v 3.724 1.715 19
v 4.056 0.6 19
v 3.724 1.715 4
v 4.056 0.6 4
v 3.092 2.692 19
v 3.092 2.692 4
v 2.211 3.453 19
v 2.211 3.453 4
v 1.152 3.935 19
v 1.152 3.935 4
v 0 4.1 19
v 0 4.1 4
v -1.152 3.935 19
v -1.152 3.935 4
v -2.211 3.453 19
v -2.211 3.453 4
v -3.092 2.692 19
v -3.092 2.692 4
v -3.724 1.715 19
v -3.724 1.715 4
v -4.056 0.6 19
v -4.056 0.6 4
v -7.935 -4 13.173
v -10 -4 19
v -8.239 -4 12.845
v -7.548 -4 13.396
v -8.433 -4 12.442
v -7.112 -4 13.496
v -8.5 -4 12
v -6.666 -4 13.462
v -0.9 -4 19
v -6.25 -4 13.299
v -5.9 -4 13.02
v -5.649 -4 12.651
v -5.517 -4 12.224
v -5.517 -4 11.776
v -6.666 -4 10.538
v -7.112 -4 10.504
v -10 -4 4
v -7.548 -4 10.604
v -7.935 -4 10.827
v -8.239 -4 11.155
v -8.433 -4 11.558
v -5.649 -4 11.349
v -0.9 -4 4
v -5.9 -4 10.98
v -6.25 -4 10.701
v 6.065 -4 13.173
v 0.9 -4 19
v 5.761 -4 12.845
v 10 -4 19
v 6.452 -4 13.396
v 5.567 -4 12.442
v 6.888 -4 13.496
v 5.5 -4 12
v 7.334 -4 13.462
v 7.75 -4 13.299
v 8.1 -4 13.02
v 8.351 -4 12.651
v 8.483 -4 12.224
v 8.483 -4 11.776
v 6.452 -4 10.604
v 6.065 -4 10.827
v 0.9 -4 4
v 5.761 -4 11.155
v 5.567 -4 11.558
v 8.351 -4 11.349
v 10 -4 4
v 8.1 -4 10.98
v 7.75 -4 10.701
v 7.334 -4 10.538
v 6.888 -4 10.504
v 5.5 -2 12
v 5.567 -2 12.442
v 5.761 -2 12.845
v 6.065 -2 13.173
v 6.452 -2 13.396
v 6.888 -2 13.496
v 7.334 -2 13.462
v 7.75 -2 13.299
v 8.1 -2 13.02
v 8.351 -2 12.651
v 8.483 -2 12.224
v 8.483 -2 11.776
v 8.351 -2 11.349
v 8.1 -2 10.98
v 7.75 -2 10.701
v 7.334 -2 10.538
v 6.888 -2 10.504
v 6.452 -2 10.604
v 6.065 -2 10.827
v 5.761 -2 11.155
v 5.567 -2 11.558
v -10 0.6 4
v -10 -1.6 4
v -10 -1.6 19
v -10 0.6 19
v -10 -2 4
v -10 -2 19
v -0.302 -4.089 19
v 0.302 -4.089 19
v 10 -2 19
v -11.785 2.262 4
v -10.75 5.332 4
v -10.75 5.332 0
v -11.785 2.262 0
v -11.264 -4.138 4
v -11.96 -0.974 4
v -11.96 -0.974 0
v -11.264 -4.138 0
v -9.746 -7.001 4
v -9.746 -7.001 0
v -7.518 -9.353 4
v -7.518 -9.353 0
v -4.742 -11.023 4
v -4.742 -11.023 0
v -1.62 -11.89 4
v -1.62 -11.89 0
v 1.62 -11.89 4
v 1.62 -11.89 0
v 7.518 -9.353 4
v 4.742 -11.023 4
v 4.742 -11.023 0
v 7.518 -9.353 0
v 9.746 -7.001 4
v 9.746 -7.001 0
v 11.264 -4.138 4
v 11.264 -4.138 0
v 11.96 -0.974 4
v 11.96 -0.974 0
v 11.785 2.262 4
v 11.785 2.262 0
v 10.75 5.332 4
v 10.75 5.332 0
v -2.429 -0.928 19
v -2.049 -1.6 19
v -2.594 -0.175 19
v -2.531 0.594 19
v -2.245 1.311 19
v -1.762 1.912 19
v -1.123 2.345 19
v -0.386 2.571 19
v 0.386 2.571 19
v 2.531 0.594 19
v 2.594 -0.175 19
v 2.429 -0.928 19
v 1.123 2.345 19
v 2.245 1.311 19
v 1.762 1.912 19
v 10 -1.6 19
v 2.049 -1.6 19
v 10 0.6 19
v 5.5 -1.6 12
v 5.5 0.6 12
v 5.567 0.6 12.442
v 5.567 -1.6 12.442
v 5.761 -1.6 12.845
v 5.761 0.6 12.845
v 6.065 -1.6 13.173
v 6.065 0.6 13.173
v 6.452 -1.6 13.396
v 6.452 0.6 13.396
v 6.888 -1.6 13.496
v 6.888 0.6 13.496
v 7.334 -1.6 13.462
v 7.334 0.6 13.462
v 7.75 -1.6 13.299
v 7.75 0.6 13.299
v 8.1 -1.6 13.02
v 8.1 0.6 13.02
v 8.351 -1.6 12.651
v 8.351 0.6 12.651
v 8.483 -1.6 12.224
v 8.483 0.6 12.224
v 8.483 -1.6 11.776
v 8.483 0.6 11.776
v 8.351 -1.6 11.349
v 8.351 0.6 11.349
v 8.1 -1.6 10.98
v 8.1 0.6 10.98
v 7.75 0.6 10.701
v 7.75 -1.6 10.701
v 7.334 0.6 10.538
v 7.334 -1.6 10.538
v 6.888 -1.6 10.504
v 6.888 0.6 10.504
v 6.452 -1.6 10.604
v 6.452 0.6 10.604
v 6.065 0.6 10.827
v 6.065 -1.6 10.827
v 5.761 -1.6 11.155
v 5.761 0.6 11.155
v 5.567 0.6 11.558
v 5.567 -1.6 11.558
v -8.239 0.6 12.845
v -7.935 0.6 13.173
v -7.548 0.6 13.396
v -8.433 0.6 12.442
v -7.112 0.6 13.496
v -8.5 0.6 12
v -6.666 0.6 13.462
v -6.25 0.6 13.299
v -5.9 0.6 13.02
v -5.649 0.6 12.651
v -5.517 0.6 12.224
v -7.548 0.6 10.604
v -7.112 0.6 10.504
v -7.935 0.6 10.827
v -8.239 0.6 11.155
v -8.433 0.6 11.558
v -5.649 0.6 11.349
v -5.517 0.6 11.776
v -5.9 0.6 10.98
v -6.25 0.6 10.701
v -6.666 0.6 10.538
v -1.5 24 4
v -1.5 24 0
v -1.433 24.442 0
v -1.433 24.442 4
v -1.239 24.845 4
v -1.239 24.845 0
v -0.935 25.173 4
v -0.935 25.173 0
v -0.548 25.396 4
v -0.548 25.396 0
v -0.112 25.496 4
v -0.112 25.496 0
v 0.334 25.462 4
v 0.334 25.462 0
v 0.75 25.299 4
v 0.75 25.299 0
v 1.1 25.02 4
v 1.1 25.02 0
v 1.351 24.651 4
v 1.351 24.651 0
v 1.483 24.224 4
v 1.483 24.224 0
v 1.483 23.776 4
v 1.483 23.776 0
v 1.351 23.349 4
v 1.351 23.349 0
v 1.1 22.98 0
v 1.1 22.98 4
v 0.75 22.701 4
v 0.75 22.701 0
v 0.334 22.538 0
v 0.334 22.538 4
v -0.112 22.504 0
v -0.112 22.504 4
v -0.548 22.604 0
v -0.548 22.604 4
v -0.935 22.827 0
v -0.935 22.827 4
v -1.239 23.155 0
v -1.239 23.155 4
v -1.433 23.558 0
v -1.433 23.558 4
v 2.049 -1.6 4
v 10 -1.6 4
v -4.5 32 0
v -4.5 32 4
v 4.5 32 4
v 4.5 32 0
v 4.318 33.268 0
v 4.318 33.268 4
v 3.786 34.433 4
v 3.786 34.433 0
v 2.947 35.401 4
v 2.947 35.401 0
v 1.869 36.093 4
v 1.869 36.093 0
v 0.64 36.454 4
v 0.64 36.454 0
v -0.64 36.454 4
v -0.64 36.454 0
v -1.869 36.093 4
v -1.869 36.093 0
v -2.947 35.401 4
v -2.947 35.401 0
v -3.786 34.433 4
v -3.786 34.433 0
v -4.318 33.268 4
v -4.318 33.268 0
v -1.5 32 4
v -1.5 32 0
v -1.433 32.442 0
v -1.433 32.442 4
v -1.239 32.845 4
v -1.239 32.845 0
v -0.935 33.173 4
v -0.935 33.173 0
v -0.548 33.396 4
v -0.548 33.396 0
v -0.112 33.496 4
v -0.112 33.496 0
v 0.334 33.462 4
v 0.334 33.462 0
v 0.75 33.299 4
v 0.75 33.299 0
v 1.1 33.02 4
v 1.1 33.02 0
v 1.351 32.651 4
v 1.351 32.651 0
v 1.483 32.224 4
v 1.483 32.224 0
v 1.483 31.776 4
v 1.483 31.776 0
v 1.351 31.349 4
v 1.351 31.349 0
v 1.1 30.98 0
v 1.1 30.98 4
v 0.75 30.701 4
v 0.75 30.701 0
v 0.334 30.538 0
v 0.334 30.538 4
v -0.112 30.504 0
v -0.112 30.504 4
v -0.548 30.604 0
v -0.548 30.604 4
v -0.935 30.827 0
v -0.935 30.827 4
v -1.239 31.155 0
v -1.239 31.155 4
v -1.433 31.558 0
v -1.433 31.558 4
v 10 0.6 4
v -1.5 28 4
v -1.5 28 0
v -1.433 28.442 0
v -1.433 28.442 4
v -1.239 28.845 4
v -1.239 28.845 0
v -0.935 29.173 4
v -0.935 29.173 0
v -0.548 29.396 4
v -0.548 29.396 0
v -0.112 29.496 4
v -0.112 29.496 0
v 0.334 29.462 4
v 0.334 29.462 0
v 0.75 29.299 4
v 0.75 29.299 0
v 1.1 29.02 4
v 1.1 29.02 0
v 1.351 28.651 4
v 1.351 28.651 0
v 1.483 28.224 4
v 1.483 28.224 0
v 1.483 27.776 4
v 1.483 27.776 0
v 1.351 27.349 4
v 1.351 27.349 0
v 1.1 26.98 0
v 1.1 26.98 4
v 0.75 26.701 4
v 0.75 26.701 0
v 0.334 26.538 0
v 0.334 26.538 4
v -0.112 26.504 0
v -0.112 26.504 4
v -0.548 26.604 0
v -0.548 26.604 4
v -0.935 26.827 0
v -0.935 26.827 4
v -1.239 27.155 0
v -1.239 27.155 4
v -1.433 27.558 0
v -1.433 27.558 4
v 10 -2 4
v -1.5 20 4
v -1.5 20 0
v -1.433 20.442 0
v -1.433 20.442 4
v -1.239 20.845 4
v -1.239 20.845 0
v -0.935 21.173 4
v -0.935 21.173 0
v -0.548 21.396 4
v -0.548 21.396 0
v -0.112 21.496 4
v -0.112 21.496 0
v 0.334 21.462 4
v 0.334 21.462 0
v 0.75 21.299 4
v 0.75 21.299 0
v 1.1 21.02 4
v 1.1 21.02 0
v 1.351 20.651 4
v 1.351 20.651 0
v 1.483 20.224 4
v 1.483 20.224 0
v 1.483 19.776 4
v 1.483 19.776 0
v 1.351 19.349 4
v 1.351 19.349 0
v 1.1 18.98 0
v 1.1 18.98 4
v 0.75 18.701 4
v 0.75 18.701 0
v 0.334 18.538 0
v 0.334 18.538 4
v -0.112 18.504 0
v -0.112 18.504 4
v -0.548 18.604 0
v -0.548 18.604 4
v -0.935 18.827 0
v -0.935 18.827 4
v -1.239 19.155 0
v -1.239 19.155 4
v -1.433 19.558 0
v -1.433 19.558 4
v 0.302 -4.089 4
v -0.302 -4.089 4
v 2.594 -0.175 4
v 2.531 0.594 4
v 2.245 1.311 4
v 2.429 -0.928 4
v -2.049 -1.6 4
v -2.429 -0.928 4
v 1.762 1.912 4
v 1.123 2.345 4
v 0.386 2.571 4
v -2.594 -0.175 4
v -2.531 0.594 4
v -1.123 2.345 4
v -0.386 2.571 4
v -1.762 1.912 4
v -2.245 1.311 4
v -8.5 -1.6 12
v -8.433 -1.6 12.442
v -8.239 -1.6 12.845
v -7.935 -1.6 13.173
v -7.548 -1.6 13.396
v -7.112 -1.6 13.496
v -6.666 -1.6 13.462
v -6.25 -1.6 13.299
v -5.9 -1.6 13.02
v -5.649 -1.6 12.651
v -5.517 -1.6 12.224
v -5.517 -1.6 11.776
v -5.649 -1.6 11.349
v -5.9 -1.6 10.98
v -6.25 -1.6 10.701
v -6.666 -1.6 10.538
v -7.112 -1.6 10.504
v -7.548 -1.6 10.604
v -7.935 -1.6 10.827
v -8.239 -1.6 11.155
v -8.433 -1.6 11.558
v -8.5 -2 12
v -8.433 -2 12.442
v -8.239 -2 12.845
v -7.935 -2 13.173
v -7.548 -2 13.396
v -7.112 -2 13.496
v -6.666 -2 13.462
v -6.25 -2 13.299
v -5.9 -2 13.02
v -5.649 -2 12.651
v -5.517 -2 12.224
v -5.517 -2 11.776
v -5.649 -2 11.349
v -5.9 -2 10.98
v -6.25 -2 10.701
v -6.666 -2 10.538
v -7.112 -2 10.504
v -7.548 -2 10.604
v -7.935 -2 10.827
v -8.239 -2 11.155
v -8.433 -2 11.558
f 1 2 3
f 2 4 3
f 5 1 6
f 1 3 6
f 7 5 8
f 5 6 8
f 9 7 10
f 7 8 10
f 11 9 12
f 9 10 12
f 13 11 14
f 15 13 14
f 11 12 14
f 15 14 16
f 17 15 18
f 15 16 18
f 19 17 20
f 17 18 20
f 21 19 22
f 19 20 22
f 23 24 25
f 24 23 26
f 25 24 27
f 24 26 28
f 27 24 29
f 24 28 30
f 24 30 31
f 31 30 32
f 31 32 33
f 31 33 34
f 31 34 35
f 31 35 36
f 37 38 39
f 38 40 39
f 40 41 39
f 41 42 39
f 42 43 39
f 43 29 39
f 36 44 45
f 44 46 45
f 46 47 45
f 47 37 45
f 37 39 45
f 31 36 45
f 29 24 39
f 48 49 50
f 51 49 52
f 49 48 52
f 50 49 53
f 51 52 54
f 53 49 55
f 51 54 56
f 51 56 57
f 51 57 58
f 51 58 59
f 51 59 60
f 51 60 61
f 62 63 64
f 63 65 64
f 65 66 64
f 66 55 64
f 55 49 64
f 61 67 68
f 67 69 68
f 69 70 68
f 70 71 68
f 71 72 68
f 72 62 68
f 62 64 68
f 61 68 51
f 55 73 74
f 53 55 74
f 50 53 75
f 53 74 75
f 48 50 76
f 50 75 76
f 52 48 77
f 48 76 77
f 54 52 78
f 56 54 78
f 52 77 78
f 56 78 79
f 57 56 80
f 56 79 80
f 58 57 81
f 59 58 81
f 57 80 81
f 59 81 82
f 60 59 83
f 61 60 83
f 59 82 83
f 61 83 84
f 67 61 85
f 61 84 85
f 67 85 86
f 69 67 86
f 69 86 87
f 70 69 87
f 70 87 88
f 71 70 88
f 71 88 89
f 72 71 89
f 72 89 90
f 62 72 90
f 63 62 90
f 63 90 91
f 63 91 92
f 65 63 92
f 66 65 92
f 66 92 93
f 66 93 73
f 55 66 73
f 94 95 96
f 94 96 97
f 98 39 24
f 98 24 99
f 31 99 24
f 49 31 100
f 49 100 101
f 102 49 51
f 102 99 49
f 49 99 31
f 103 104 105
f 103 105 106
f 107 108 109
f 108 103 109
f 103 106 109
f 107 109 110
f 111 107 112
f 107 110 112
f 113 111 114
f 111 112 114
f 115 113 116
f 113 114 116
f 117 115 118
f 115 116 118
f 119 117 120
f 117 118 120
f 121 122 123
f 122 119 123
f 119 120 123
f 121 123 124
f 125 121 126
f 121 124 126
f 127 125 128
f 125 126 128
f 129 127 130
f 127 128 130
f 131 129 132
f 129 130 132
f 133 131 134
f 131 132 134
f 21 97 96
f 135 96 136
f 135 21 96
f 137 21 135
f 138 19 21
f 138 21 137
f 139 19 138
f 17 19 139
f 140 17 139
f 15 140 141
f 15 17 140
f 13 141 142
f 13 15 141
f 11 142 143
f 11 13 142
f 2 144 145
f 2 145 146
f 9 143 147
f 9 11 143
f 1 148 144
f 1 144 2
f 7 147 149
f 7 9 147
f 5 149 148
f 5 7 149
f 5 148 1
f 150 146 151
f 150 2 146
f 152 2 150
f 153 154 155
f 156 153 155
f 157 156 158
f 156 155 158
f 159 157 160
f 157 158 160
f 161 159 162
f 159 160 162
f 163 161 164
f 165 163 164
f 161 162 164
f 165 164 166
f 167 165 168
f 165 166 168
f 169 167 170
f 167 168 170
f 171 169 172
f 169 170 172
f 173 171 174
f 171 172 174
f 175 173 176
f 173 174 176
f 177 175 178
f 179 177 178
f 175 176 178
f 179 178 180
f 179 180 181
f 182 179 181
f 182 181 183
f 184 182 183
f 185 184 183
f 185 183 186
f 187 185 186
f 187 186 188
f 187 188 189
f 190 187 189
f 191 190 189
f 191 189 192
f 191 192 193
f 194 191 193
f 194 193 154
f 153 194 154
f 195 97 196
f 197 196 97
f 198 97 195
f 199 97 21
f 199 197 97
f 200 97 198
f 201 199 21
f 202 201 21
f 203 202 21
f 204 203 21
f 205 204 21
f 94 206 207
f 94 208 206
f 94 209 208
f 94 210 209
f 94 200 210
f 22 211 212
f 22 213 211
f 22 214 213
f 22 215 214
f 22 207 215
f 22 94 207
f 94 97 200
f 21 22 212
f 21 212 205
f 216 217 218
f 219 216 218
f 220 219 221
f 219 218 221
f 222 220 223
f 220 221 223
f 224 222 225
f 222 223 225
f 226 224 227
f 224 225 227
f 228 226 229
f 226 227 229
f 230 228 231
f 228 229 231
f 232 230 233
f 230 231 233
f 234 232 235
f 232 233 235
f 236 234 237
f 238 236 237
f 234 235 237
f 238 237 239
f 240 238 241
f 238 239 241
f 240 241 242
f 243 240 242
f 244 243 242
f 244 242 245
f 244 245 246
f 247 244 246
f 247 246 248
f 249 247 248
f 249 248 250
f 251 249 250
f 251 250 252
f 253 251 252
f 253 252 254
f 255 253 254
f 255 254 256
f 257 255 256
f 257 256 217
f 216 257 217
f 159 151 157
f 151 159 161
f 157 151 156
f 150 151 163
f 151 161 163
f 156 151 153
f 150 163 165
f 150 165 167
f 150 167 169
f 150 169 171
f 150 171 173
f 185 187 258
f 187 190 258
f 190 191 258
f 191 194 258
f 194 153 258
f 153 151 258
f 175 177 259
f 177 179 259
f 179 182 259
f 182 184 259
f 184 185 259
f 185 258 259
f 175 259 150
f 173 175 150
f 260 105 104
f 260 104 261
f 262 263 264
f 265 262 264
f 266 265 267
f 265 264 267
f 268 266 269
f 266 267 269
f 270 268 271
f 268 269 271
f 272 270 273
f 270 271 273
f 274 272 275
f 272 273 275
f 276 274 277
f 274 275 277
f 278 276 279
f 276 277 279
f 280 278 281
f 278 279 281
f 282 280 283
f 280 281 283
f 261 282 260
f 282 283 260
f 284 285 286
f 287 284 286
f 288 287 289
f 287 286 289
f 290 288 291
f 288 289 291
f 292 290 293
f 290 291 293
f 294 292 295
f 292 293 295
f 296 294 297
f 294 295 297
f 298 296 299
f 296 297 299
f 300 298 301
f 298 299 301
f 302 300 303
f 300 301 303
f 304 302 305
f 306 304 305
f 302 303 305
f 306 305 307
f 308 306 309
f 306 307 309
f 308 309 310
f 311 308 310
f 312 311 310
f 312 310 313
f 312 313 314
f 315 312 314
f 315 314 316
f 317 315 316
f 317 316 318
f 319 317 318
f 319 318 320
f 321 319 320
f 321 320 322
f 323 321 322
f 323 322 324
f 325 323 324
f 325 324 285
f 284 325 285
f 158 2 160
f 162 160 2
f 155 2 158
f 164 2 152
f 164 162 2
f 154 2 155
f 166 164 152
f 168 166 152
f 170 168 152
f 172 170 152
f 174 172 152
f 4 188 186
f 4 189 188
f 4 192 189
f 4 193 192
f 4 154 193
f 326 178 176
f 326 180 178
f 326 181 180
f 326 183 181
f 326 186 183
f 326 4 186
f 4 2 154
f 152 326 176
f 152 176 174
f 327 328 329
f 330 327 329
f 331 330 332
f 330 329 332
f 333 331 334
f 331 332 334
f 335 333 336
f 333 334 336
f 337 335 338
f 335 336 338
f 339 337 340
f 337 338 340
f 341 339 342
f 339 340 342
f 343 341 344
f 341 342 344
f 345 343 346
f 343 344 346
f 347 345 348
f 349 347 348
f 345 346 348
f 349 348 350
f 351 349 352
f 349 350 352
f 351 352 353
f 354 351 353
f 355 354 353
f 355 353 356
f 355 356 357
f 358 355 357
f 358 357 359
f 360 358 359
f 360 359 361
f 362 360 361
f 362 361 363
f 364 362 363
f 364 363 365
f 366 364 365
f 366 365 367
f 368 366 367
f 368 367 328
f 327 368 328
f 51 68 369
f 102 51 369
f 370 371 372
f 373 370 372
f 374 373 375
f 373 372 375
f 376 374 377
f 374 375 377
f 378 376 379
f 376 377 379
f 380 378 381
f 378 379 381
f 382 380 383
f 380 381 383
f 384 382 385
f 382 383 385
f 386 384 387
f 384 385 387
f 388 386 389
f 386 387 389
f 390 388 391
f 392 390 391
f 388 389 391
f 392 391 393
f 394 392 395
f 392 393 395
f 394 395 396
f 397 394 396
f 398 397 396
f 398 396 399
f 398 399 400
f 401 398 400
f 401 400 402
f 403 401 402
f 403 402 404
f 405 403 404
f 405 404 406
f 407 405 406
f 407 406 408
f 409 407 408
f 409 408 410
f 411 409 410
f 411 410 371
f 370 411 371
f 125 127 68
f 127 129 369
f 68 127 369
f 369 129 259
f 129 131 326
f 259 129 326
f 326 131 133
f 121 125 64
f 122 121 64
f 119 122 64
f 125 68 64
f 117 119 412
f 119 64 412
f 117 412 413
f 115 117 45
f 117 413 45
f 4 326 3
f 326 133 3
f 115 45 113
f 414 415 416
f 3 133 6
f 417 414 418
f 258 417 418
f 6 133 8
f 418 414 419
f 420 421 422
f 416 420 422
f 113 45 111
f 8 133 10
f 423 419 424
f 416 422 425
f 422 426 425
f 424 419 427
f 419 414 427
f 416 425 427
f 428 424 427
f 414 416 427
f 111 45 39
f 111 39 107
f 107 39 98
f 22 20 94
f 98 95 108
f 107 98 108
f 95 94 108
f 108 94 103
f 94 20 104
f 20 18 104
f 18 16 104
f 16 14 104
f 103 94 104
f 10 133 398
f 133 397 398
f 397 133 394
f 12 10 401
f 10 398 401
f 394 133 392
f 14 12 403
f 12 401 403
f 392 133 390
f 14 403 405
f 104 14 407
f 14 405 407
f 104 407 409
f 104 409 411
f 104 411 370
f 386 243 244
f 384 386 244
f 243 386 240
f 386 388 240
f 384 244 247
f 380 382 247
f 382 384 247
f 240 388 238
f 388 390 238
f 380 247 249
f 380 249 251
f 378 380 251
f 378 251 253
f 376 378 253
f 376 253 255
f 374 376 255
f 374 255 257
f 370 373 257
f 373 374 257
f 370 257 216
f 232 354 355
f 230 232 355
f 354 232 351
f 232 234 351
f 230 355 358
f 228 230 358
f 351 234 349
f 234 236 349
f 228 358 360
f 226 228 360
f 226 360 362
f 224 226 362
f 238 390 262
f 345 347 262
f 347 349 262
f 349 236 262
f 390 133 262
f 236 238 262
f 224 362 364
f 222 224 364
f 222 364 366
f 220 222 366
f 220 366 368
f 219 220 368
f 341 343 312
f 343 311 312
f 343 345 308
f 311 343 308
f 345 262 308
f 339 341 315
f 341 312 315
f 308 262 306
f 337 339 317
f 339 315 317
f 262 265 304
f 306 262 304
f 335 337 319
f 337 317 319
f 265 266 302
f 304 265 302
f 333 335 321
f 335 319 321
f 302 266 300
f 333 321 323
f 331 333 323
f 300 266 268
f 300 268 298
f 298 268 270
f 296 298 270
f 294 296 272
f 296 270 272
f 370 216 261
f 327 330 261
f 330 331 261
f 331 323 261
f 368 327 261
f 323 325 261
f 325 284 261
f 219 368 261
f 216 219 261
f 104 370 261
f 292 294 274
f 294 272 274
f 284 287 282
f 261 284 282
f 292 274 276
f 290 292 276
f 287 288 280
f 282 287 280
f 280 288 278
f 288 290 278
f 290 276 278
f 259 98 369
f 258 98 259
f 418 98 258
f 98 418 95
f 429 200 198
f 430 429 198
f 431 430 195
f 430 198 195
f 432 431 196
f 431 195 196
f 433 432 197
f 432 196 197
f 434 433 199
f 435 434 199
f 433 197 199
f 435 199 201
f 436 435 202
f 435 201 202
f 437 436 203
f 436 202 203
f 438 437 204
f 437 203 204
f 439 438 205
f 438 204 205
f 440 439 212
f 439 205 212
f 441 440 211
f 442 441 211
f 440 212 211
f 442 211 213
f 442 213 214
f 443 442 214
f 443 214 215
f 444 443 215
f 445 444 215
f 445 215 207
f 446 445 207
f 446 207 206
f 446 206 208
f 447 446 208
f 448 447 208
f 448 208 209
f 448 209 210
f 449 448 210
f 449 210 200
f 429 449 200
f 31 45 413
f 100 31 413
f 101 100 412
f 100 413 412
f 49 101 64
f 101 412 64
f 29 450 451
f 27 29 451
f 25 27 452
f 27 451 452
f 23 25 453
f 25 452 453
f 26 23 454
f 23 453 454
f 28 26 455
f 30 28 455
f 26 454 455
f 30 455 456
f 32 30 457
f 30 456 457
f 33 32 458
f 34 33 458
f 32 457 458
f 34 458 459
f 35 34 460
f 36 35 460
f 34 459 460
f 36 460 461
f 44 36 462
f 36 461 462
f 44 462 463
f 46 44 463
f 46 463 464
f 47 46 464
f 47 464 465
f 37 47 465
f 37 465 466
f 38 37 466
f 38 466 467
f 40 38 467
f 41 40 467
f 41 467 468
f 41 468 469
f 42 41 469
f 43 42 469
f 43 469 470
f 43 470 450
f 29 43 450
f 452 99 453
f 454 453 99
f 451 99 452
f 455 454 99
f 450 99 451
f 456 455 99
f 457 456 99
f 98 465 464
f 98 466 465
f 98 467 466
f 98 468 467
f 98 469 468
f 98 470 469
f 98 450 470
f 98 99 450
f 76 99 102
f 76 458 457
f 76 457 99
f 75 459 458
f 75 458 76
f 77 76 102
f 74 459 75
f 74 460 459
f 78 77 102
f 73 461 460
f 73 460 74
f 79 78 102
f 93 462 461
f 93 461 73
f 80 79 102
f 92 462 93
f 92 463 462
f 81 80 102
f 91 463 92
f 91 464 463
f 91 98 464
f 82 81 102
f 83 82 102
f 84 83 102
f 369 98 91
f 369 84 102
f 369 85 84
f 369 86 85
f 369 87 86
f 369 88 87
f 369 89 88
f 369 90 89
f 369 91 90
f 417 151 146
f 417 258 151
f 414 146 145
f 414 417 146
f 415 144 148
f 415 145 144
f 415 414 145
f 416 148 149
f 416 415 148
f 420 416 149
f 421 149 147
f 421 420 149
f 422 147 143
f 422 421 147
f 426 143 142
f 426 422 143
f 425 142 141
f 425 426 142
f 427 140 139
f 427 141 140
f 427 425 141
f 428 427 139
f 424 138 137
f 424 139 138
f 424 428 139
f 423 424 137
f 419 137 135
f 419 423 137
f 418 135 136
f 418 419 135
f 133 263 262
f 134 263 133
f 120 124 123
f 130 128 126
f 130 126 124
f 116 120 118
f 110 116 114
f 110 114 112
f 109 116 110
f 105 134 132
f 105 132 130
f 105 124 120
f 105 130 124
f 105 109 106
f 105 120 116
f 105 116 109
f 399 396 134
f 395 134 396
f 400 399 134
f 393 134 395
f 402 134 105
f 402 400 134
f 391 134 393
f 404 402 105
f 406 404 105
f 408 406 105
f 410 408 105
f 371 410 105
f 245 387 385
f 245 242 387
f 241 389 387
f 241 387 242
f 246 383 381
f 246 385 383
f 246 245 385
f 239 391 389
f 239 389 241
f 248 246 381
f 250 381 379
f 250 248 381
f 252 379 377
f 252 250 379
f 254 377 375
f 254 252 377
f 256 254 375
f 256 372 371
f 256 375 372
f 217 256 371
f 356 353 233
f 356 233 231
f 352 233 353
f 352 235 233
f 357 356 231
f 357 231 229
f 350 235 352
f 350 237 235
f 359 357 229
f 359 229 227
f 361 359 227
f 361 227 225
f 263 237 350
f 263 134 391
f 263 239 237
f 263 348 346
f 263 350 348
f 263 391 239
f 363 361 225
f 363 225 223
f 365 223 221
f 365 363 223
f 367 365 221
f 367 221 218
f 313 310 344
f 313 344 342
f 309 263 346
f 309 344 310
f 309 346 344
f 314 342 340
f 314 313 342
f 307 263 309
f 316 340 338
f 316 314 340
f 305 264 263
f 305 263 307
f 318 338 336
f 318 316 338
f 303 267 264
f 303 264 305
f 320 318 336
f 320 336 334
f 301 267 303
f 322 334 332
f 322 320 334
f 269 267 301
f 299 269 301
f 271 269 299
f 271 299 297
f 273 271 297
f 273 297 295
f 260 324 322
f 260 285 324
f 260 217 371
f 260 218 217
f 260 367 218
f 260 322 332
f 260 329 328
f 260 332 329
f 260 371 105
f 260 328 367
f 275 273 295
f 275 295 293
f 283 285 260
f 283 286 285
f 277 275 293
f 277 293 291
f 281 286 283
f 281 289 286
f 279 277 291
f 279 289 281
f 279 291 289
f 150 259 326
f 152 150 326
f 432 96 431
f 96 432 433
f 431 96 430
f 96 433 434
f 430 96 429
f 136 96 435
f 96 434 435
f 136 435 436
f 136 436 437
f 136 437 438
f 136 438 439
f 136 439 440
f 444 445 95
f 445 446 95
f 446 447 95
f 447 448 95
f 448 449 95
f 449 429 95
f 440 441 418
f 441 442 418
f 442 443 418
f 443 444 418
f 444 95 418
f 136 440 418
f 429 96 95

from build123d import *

# Parameters (mm, degrees)
SZKIC1_R                      = 12
DODANIE_WYCI_GNI_CIE2_DEPTH   = 4
SZKIC1_R_2                    = 4.5
DODANIE_WYCI_GNI_CIE2_2_DEPTH = 4
DODANIE_WYCI_GNI_CIE3_DEPTH   = 4
WYTNIJ_WYCI_GNI_CIE1_REACH    = 40.63
SZKIC3_R                      = 1.5
SZKIC4_R                      = 4.1
SZKIC4_R_2                    = 2.6
DODANIE_WYCI_GNI_CIE4_DEPTH   = 15
SZKIC5_W                      = 20
SZKIC5_H                      = 2
DODANIE_WYCI_GNI_CIE5_DEPTH   = 15
SZKIC6_W                      = 16
SZKIC6_H                      = 0.4
WYTNIJ_WYCI_GNI_CIE2_DEPTH    = 15
SZKIC7_W                      = 6.95515277
SZKIC7_H                      = 2.2
SZKIC7_W_2                    = 6.645937882
DODANIE_WYCI_GNI_CIE6_DEPTH   = 15
SZKIC10_R                     = 1.5
WYTNIJ_WYCI_GNI_CIE4_DEPTH    = 5


with BuildPart() as part:
    # Szkic1 → Dodanie-wyciągnięcie2 (new body)
    with BuildSketch(Plane.XY):
        Circle(SZKIC1_R)
    extrude(amount=DODANIE_WYCI_GNI_CIE2_DEPTH)



with BuildPart() as body_2:
    # Szkic1 → Dodanie-wyci_gni_cie2 2 (new body)
    with BuildSketch(Plane.XY):
        with Locations((0, 32)):
            Circle(SZKIC1_R_2)
    extrude(amount=DODANIE_WYCI_GNI_CIE2_2_DEPTH)


with BuildPart() as part_1:
    add(part.part)

    add(body_2.part)  # Dodanie-wyciągnięcie3 merges body 2
    # Szkic2 → Dodanie-wyciągnięcie3 (add)
    with BuildSketch(Plane(origin=(0, 0, 0), x_dir=(-1, 0, 0), z_dir=(0, 0, -1))):
        Polygon((-4.5, 32), (-12, 0), (12, 0), (4.5, 32), align=None)
    extrude(amount=-DODANIE_WYCI_GNI_CIE3_DEPTH)

    # Szkic3 → Wytnij-wyciągnięcie1 (cut, up to next)
    with BuildSketch(Plane(origin=(0, 0, 0), x_dir=(-1, 0, 0), z_dir=(0, 0, -1)), mode=Mode.PRIVATE) as wytnij_wyci_gni_cie1_sk1:
        with Locations((0, 32)):
            Circle(SZKIC3_R)
    wytnij_wyci_gni_cie1_tool1 = extrude(wytnij_wyci_gni_cie1_sk1.sketch, amount=-WYTNIJ_WYCI_GNI_CIE1_REACH, mode=Mode.PRIVATE) & part_1.part
    # Szkic3 → Wytnij-wyciągnięcie1 (cut, up to next)
    with BuildSketch(Plane(origin=(0, 0, 0), x_dir=(-1, 0, 0), z_dir=(0, 0, -1)), mode=Mode.PRIVATE) as wytnij_wyci_gni_cie1_sk2:
        with Locations((0, 28)):
            Circle(SZKIC3_R)
    wytnij_wyci_gni_cie1_tool2 = extrude(wytnij_wyci_gni_cie1_sk2.sketch, amount=-WYTNIJ_WYCI_GNI_CIE1_REACH, mode=Mode.PRIVATE) & part_1.part
    # Szkic3 → Wytnij-wyciągnięcie1 (cut, up to next)
    with BuildSketch(Plane(origin=(0, 0, 0), x_dir=(-1, 0, 0), z_dir=(0, 0, -1)), mode=Mode.PRIVATE) as wytnij_wyci_gni_cie1_sk3:
        with Locations((0, 24)):
            Circle(SZKIC3_R)
    wytnij_wyci_gni_cie1_tool3 = extrude(wytnij_wyci_gni_cie1_sk3.sketch, amount=-WYTNIJ_WYCI_GNI_CIE1_REACH, mode=Mode.PRIVATE) & part_1.part
    # Szkic3 → Wytnij-wyciągnięcie1 (cut, up to next)
    with BuildSketch(Plane(origin=(0, 0, 0), x_dir=(-1, 0, 0), z_dir=(0, 0, -1)), mode=Mode.PRIVATE) as wytnij_wyci_gni_cie1_sk4:
        with Locations((0, 20)):
            Circle(SZKIC3_R)
    wytnij_wyci_gni_cie1_tool4 = extrude(wytnij_wyci_gni_cie1_sk4.sketch, amount=-WYTNIJ_WYCI_GNI_CIE1_REACH, mode=Mode.PRIVATE) & part_1.part
    add(wytnij_wyci_gni_cie1_tool1.solids().sort_by_distance((0, 32, 0))[0], mode=Mode.SUBTRACT)
    add(wytnij_wyci_gni_cie1_tool2.solids().sort_by_distance((0, 28, 0))[0], mode=Mode.SUBTRACT)
    add(wytnij_wyci_gni_cie1_tool3.solids().sort_by_distance((0, 24, 0))[0], mode=Mode.SUBTRACT)
    add(wytnij_wyci_gni_cie1_tool4.solids().sort_by_distance((0, 20, 0))[0], mode=Mode.SUBTRACT)

    # Szkic4 → Dodanie-wyciągnięcie4 (add)
    with BuildSketch(Plane.XY.offset(4)):
        Circle(SZKIC4_R)
        Circle(SZKIC4_R_2, mode=Mode.SUBTRACT)
    extrude(amount=DODANIE_WYCI_GNI_CIE4_DEPTH)

    # Szkic5 → Dodanie-wyciągnięcie5 (add)
    with BuildSketch(Plane.XY.offset(4)):
        with Locations((0, -3)):
            Rectangle(SZKIC5_W, SZKIC5_H)
    extrude(amount=DODANIE_WYCI_GNI_CIE5_DEPTH)

    # Szkic6 → Wytnij-wyciągnięcie2 (cut)
    with BuildSketch(Plane.XY.offset(4)):
        with Locations((-2, -1.8)):
            Rectangle(SZKIC6_W, SZKIC6_H)
    extrude(amount=WYTNIJ_WYCI_GNI_CIE2_DEPTH, mode=Mode.SUBTRACT)

    # Szkic7 → Dodanie-wyciągnięcie6 (add)
    with BuildSketch(Plane.XY.offset(4)):
        with Locations((-6.522423615, -0.5)):
            Rectangle(SZKIC7_W, SZKIC7_H)
        with Locations((6.677031059, -0.5)):
            Rectangle(SZKIC7_W_2, SZKIC7_H)
    extrude(amount=DODANIE_WYCI_GNI_CIE6_DEPTH)

    # Szkic10 → Wytnij-wyciągnięcie4 (cut)
    with BuildSketch(Plane(origin=(0, 0.6, 0), x_dir=(1, 0, 0), z_dir=(0, 1, 0))):
        with Locations(Location((-7, -12, 0), (0, 0, 180))):
            Circle(SZKIC10_R)
        with Locations(Location((7, -12, 0), (0, 0, 180))):
            Circle(SZKIC10_R)
    extrude(amount=-WYTNIJ_WYCI_GNI_CIE4_DEPTH, mode=Mode.SUBTRACT)


solid = part_1.part
